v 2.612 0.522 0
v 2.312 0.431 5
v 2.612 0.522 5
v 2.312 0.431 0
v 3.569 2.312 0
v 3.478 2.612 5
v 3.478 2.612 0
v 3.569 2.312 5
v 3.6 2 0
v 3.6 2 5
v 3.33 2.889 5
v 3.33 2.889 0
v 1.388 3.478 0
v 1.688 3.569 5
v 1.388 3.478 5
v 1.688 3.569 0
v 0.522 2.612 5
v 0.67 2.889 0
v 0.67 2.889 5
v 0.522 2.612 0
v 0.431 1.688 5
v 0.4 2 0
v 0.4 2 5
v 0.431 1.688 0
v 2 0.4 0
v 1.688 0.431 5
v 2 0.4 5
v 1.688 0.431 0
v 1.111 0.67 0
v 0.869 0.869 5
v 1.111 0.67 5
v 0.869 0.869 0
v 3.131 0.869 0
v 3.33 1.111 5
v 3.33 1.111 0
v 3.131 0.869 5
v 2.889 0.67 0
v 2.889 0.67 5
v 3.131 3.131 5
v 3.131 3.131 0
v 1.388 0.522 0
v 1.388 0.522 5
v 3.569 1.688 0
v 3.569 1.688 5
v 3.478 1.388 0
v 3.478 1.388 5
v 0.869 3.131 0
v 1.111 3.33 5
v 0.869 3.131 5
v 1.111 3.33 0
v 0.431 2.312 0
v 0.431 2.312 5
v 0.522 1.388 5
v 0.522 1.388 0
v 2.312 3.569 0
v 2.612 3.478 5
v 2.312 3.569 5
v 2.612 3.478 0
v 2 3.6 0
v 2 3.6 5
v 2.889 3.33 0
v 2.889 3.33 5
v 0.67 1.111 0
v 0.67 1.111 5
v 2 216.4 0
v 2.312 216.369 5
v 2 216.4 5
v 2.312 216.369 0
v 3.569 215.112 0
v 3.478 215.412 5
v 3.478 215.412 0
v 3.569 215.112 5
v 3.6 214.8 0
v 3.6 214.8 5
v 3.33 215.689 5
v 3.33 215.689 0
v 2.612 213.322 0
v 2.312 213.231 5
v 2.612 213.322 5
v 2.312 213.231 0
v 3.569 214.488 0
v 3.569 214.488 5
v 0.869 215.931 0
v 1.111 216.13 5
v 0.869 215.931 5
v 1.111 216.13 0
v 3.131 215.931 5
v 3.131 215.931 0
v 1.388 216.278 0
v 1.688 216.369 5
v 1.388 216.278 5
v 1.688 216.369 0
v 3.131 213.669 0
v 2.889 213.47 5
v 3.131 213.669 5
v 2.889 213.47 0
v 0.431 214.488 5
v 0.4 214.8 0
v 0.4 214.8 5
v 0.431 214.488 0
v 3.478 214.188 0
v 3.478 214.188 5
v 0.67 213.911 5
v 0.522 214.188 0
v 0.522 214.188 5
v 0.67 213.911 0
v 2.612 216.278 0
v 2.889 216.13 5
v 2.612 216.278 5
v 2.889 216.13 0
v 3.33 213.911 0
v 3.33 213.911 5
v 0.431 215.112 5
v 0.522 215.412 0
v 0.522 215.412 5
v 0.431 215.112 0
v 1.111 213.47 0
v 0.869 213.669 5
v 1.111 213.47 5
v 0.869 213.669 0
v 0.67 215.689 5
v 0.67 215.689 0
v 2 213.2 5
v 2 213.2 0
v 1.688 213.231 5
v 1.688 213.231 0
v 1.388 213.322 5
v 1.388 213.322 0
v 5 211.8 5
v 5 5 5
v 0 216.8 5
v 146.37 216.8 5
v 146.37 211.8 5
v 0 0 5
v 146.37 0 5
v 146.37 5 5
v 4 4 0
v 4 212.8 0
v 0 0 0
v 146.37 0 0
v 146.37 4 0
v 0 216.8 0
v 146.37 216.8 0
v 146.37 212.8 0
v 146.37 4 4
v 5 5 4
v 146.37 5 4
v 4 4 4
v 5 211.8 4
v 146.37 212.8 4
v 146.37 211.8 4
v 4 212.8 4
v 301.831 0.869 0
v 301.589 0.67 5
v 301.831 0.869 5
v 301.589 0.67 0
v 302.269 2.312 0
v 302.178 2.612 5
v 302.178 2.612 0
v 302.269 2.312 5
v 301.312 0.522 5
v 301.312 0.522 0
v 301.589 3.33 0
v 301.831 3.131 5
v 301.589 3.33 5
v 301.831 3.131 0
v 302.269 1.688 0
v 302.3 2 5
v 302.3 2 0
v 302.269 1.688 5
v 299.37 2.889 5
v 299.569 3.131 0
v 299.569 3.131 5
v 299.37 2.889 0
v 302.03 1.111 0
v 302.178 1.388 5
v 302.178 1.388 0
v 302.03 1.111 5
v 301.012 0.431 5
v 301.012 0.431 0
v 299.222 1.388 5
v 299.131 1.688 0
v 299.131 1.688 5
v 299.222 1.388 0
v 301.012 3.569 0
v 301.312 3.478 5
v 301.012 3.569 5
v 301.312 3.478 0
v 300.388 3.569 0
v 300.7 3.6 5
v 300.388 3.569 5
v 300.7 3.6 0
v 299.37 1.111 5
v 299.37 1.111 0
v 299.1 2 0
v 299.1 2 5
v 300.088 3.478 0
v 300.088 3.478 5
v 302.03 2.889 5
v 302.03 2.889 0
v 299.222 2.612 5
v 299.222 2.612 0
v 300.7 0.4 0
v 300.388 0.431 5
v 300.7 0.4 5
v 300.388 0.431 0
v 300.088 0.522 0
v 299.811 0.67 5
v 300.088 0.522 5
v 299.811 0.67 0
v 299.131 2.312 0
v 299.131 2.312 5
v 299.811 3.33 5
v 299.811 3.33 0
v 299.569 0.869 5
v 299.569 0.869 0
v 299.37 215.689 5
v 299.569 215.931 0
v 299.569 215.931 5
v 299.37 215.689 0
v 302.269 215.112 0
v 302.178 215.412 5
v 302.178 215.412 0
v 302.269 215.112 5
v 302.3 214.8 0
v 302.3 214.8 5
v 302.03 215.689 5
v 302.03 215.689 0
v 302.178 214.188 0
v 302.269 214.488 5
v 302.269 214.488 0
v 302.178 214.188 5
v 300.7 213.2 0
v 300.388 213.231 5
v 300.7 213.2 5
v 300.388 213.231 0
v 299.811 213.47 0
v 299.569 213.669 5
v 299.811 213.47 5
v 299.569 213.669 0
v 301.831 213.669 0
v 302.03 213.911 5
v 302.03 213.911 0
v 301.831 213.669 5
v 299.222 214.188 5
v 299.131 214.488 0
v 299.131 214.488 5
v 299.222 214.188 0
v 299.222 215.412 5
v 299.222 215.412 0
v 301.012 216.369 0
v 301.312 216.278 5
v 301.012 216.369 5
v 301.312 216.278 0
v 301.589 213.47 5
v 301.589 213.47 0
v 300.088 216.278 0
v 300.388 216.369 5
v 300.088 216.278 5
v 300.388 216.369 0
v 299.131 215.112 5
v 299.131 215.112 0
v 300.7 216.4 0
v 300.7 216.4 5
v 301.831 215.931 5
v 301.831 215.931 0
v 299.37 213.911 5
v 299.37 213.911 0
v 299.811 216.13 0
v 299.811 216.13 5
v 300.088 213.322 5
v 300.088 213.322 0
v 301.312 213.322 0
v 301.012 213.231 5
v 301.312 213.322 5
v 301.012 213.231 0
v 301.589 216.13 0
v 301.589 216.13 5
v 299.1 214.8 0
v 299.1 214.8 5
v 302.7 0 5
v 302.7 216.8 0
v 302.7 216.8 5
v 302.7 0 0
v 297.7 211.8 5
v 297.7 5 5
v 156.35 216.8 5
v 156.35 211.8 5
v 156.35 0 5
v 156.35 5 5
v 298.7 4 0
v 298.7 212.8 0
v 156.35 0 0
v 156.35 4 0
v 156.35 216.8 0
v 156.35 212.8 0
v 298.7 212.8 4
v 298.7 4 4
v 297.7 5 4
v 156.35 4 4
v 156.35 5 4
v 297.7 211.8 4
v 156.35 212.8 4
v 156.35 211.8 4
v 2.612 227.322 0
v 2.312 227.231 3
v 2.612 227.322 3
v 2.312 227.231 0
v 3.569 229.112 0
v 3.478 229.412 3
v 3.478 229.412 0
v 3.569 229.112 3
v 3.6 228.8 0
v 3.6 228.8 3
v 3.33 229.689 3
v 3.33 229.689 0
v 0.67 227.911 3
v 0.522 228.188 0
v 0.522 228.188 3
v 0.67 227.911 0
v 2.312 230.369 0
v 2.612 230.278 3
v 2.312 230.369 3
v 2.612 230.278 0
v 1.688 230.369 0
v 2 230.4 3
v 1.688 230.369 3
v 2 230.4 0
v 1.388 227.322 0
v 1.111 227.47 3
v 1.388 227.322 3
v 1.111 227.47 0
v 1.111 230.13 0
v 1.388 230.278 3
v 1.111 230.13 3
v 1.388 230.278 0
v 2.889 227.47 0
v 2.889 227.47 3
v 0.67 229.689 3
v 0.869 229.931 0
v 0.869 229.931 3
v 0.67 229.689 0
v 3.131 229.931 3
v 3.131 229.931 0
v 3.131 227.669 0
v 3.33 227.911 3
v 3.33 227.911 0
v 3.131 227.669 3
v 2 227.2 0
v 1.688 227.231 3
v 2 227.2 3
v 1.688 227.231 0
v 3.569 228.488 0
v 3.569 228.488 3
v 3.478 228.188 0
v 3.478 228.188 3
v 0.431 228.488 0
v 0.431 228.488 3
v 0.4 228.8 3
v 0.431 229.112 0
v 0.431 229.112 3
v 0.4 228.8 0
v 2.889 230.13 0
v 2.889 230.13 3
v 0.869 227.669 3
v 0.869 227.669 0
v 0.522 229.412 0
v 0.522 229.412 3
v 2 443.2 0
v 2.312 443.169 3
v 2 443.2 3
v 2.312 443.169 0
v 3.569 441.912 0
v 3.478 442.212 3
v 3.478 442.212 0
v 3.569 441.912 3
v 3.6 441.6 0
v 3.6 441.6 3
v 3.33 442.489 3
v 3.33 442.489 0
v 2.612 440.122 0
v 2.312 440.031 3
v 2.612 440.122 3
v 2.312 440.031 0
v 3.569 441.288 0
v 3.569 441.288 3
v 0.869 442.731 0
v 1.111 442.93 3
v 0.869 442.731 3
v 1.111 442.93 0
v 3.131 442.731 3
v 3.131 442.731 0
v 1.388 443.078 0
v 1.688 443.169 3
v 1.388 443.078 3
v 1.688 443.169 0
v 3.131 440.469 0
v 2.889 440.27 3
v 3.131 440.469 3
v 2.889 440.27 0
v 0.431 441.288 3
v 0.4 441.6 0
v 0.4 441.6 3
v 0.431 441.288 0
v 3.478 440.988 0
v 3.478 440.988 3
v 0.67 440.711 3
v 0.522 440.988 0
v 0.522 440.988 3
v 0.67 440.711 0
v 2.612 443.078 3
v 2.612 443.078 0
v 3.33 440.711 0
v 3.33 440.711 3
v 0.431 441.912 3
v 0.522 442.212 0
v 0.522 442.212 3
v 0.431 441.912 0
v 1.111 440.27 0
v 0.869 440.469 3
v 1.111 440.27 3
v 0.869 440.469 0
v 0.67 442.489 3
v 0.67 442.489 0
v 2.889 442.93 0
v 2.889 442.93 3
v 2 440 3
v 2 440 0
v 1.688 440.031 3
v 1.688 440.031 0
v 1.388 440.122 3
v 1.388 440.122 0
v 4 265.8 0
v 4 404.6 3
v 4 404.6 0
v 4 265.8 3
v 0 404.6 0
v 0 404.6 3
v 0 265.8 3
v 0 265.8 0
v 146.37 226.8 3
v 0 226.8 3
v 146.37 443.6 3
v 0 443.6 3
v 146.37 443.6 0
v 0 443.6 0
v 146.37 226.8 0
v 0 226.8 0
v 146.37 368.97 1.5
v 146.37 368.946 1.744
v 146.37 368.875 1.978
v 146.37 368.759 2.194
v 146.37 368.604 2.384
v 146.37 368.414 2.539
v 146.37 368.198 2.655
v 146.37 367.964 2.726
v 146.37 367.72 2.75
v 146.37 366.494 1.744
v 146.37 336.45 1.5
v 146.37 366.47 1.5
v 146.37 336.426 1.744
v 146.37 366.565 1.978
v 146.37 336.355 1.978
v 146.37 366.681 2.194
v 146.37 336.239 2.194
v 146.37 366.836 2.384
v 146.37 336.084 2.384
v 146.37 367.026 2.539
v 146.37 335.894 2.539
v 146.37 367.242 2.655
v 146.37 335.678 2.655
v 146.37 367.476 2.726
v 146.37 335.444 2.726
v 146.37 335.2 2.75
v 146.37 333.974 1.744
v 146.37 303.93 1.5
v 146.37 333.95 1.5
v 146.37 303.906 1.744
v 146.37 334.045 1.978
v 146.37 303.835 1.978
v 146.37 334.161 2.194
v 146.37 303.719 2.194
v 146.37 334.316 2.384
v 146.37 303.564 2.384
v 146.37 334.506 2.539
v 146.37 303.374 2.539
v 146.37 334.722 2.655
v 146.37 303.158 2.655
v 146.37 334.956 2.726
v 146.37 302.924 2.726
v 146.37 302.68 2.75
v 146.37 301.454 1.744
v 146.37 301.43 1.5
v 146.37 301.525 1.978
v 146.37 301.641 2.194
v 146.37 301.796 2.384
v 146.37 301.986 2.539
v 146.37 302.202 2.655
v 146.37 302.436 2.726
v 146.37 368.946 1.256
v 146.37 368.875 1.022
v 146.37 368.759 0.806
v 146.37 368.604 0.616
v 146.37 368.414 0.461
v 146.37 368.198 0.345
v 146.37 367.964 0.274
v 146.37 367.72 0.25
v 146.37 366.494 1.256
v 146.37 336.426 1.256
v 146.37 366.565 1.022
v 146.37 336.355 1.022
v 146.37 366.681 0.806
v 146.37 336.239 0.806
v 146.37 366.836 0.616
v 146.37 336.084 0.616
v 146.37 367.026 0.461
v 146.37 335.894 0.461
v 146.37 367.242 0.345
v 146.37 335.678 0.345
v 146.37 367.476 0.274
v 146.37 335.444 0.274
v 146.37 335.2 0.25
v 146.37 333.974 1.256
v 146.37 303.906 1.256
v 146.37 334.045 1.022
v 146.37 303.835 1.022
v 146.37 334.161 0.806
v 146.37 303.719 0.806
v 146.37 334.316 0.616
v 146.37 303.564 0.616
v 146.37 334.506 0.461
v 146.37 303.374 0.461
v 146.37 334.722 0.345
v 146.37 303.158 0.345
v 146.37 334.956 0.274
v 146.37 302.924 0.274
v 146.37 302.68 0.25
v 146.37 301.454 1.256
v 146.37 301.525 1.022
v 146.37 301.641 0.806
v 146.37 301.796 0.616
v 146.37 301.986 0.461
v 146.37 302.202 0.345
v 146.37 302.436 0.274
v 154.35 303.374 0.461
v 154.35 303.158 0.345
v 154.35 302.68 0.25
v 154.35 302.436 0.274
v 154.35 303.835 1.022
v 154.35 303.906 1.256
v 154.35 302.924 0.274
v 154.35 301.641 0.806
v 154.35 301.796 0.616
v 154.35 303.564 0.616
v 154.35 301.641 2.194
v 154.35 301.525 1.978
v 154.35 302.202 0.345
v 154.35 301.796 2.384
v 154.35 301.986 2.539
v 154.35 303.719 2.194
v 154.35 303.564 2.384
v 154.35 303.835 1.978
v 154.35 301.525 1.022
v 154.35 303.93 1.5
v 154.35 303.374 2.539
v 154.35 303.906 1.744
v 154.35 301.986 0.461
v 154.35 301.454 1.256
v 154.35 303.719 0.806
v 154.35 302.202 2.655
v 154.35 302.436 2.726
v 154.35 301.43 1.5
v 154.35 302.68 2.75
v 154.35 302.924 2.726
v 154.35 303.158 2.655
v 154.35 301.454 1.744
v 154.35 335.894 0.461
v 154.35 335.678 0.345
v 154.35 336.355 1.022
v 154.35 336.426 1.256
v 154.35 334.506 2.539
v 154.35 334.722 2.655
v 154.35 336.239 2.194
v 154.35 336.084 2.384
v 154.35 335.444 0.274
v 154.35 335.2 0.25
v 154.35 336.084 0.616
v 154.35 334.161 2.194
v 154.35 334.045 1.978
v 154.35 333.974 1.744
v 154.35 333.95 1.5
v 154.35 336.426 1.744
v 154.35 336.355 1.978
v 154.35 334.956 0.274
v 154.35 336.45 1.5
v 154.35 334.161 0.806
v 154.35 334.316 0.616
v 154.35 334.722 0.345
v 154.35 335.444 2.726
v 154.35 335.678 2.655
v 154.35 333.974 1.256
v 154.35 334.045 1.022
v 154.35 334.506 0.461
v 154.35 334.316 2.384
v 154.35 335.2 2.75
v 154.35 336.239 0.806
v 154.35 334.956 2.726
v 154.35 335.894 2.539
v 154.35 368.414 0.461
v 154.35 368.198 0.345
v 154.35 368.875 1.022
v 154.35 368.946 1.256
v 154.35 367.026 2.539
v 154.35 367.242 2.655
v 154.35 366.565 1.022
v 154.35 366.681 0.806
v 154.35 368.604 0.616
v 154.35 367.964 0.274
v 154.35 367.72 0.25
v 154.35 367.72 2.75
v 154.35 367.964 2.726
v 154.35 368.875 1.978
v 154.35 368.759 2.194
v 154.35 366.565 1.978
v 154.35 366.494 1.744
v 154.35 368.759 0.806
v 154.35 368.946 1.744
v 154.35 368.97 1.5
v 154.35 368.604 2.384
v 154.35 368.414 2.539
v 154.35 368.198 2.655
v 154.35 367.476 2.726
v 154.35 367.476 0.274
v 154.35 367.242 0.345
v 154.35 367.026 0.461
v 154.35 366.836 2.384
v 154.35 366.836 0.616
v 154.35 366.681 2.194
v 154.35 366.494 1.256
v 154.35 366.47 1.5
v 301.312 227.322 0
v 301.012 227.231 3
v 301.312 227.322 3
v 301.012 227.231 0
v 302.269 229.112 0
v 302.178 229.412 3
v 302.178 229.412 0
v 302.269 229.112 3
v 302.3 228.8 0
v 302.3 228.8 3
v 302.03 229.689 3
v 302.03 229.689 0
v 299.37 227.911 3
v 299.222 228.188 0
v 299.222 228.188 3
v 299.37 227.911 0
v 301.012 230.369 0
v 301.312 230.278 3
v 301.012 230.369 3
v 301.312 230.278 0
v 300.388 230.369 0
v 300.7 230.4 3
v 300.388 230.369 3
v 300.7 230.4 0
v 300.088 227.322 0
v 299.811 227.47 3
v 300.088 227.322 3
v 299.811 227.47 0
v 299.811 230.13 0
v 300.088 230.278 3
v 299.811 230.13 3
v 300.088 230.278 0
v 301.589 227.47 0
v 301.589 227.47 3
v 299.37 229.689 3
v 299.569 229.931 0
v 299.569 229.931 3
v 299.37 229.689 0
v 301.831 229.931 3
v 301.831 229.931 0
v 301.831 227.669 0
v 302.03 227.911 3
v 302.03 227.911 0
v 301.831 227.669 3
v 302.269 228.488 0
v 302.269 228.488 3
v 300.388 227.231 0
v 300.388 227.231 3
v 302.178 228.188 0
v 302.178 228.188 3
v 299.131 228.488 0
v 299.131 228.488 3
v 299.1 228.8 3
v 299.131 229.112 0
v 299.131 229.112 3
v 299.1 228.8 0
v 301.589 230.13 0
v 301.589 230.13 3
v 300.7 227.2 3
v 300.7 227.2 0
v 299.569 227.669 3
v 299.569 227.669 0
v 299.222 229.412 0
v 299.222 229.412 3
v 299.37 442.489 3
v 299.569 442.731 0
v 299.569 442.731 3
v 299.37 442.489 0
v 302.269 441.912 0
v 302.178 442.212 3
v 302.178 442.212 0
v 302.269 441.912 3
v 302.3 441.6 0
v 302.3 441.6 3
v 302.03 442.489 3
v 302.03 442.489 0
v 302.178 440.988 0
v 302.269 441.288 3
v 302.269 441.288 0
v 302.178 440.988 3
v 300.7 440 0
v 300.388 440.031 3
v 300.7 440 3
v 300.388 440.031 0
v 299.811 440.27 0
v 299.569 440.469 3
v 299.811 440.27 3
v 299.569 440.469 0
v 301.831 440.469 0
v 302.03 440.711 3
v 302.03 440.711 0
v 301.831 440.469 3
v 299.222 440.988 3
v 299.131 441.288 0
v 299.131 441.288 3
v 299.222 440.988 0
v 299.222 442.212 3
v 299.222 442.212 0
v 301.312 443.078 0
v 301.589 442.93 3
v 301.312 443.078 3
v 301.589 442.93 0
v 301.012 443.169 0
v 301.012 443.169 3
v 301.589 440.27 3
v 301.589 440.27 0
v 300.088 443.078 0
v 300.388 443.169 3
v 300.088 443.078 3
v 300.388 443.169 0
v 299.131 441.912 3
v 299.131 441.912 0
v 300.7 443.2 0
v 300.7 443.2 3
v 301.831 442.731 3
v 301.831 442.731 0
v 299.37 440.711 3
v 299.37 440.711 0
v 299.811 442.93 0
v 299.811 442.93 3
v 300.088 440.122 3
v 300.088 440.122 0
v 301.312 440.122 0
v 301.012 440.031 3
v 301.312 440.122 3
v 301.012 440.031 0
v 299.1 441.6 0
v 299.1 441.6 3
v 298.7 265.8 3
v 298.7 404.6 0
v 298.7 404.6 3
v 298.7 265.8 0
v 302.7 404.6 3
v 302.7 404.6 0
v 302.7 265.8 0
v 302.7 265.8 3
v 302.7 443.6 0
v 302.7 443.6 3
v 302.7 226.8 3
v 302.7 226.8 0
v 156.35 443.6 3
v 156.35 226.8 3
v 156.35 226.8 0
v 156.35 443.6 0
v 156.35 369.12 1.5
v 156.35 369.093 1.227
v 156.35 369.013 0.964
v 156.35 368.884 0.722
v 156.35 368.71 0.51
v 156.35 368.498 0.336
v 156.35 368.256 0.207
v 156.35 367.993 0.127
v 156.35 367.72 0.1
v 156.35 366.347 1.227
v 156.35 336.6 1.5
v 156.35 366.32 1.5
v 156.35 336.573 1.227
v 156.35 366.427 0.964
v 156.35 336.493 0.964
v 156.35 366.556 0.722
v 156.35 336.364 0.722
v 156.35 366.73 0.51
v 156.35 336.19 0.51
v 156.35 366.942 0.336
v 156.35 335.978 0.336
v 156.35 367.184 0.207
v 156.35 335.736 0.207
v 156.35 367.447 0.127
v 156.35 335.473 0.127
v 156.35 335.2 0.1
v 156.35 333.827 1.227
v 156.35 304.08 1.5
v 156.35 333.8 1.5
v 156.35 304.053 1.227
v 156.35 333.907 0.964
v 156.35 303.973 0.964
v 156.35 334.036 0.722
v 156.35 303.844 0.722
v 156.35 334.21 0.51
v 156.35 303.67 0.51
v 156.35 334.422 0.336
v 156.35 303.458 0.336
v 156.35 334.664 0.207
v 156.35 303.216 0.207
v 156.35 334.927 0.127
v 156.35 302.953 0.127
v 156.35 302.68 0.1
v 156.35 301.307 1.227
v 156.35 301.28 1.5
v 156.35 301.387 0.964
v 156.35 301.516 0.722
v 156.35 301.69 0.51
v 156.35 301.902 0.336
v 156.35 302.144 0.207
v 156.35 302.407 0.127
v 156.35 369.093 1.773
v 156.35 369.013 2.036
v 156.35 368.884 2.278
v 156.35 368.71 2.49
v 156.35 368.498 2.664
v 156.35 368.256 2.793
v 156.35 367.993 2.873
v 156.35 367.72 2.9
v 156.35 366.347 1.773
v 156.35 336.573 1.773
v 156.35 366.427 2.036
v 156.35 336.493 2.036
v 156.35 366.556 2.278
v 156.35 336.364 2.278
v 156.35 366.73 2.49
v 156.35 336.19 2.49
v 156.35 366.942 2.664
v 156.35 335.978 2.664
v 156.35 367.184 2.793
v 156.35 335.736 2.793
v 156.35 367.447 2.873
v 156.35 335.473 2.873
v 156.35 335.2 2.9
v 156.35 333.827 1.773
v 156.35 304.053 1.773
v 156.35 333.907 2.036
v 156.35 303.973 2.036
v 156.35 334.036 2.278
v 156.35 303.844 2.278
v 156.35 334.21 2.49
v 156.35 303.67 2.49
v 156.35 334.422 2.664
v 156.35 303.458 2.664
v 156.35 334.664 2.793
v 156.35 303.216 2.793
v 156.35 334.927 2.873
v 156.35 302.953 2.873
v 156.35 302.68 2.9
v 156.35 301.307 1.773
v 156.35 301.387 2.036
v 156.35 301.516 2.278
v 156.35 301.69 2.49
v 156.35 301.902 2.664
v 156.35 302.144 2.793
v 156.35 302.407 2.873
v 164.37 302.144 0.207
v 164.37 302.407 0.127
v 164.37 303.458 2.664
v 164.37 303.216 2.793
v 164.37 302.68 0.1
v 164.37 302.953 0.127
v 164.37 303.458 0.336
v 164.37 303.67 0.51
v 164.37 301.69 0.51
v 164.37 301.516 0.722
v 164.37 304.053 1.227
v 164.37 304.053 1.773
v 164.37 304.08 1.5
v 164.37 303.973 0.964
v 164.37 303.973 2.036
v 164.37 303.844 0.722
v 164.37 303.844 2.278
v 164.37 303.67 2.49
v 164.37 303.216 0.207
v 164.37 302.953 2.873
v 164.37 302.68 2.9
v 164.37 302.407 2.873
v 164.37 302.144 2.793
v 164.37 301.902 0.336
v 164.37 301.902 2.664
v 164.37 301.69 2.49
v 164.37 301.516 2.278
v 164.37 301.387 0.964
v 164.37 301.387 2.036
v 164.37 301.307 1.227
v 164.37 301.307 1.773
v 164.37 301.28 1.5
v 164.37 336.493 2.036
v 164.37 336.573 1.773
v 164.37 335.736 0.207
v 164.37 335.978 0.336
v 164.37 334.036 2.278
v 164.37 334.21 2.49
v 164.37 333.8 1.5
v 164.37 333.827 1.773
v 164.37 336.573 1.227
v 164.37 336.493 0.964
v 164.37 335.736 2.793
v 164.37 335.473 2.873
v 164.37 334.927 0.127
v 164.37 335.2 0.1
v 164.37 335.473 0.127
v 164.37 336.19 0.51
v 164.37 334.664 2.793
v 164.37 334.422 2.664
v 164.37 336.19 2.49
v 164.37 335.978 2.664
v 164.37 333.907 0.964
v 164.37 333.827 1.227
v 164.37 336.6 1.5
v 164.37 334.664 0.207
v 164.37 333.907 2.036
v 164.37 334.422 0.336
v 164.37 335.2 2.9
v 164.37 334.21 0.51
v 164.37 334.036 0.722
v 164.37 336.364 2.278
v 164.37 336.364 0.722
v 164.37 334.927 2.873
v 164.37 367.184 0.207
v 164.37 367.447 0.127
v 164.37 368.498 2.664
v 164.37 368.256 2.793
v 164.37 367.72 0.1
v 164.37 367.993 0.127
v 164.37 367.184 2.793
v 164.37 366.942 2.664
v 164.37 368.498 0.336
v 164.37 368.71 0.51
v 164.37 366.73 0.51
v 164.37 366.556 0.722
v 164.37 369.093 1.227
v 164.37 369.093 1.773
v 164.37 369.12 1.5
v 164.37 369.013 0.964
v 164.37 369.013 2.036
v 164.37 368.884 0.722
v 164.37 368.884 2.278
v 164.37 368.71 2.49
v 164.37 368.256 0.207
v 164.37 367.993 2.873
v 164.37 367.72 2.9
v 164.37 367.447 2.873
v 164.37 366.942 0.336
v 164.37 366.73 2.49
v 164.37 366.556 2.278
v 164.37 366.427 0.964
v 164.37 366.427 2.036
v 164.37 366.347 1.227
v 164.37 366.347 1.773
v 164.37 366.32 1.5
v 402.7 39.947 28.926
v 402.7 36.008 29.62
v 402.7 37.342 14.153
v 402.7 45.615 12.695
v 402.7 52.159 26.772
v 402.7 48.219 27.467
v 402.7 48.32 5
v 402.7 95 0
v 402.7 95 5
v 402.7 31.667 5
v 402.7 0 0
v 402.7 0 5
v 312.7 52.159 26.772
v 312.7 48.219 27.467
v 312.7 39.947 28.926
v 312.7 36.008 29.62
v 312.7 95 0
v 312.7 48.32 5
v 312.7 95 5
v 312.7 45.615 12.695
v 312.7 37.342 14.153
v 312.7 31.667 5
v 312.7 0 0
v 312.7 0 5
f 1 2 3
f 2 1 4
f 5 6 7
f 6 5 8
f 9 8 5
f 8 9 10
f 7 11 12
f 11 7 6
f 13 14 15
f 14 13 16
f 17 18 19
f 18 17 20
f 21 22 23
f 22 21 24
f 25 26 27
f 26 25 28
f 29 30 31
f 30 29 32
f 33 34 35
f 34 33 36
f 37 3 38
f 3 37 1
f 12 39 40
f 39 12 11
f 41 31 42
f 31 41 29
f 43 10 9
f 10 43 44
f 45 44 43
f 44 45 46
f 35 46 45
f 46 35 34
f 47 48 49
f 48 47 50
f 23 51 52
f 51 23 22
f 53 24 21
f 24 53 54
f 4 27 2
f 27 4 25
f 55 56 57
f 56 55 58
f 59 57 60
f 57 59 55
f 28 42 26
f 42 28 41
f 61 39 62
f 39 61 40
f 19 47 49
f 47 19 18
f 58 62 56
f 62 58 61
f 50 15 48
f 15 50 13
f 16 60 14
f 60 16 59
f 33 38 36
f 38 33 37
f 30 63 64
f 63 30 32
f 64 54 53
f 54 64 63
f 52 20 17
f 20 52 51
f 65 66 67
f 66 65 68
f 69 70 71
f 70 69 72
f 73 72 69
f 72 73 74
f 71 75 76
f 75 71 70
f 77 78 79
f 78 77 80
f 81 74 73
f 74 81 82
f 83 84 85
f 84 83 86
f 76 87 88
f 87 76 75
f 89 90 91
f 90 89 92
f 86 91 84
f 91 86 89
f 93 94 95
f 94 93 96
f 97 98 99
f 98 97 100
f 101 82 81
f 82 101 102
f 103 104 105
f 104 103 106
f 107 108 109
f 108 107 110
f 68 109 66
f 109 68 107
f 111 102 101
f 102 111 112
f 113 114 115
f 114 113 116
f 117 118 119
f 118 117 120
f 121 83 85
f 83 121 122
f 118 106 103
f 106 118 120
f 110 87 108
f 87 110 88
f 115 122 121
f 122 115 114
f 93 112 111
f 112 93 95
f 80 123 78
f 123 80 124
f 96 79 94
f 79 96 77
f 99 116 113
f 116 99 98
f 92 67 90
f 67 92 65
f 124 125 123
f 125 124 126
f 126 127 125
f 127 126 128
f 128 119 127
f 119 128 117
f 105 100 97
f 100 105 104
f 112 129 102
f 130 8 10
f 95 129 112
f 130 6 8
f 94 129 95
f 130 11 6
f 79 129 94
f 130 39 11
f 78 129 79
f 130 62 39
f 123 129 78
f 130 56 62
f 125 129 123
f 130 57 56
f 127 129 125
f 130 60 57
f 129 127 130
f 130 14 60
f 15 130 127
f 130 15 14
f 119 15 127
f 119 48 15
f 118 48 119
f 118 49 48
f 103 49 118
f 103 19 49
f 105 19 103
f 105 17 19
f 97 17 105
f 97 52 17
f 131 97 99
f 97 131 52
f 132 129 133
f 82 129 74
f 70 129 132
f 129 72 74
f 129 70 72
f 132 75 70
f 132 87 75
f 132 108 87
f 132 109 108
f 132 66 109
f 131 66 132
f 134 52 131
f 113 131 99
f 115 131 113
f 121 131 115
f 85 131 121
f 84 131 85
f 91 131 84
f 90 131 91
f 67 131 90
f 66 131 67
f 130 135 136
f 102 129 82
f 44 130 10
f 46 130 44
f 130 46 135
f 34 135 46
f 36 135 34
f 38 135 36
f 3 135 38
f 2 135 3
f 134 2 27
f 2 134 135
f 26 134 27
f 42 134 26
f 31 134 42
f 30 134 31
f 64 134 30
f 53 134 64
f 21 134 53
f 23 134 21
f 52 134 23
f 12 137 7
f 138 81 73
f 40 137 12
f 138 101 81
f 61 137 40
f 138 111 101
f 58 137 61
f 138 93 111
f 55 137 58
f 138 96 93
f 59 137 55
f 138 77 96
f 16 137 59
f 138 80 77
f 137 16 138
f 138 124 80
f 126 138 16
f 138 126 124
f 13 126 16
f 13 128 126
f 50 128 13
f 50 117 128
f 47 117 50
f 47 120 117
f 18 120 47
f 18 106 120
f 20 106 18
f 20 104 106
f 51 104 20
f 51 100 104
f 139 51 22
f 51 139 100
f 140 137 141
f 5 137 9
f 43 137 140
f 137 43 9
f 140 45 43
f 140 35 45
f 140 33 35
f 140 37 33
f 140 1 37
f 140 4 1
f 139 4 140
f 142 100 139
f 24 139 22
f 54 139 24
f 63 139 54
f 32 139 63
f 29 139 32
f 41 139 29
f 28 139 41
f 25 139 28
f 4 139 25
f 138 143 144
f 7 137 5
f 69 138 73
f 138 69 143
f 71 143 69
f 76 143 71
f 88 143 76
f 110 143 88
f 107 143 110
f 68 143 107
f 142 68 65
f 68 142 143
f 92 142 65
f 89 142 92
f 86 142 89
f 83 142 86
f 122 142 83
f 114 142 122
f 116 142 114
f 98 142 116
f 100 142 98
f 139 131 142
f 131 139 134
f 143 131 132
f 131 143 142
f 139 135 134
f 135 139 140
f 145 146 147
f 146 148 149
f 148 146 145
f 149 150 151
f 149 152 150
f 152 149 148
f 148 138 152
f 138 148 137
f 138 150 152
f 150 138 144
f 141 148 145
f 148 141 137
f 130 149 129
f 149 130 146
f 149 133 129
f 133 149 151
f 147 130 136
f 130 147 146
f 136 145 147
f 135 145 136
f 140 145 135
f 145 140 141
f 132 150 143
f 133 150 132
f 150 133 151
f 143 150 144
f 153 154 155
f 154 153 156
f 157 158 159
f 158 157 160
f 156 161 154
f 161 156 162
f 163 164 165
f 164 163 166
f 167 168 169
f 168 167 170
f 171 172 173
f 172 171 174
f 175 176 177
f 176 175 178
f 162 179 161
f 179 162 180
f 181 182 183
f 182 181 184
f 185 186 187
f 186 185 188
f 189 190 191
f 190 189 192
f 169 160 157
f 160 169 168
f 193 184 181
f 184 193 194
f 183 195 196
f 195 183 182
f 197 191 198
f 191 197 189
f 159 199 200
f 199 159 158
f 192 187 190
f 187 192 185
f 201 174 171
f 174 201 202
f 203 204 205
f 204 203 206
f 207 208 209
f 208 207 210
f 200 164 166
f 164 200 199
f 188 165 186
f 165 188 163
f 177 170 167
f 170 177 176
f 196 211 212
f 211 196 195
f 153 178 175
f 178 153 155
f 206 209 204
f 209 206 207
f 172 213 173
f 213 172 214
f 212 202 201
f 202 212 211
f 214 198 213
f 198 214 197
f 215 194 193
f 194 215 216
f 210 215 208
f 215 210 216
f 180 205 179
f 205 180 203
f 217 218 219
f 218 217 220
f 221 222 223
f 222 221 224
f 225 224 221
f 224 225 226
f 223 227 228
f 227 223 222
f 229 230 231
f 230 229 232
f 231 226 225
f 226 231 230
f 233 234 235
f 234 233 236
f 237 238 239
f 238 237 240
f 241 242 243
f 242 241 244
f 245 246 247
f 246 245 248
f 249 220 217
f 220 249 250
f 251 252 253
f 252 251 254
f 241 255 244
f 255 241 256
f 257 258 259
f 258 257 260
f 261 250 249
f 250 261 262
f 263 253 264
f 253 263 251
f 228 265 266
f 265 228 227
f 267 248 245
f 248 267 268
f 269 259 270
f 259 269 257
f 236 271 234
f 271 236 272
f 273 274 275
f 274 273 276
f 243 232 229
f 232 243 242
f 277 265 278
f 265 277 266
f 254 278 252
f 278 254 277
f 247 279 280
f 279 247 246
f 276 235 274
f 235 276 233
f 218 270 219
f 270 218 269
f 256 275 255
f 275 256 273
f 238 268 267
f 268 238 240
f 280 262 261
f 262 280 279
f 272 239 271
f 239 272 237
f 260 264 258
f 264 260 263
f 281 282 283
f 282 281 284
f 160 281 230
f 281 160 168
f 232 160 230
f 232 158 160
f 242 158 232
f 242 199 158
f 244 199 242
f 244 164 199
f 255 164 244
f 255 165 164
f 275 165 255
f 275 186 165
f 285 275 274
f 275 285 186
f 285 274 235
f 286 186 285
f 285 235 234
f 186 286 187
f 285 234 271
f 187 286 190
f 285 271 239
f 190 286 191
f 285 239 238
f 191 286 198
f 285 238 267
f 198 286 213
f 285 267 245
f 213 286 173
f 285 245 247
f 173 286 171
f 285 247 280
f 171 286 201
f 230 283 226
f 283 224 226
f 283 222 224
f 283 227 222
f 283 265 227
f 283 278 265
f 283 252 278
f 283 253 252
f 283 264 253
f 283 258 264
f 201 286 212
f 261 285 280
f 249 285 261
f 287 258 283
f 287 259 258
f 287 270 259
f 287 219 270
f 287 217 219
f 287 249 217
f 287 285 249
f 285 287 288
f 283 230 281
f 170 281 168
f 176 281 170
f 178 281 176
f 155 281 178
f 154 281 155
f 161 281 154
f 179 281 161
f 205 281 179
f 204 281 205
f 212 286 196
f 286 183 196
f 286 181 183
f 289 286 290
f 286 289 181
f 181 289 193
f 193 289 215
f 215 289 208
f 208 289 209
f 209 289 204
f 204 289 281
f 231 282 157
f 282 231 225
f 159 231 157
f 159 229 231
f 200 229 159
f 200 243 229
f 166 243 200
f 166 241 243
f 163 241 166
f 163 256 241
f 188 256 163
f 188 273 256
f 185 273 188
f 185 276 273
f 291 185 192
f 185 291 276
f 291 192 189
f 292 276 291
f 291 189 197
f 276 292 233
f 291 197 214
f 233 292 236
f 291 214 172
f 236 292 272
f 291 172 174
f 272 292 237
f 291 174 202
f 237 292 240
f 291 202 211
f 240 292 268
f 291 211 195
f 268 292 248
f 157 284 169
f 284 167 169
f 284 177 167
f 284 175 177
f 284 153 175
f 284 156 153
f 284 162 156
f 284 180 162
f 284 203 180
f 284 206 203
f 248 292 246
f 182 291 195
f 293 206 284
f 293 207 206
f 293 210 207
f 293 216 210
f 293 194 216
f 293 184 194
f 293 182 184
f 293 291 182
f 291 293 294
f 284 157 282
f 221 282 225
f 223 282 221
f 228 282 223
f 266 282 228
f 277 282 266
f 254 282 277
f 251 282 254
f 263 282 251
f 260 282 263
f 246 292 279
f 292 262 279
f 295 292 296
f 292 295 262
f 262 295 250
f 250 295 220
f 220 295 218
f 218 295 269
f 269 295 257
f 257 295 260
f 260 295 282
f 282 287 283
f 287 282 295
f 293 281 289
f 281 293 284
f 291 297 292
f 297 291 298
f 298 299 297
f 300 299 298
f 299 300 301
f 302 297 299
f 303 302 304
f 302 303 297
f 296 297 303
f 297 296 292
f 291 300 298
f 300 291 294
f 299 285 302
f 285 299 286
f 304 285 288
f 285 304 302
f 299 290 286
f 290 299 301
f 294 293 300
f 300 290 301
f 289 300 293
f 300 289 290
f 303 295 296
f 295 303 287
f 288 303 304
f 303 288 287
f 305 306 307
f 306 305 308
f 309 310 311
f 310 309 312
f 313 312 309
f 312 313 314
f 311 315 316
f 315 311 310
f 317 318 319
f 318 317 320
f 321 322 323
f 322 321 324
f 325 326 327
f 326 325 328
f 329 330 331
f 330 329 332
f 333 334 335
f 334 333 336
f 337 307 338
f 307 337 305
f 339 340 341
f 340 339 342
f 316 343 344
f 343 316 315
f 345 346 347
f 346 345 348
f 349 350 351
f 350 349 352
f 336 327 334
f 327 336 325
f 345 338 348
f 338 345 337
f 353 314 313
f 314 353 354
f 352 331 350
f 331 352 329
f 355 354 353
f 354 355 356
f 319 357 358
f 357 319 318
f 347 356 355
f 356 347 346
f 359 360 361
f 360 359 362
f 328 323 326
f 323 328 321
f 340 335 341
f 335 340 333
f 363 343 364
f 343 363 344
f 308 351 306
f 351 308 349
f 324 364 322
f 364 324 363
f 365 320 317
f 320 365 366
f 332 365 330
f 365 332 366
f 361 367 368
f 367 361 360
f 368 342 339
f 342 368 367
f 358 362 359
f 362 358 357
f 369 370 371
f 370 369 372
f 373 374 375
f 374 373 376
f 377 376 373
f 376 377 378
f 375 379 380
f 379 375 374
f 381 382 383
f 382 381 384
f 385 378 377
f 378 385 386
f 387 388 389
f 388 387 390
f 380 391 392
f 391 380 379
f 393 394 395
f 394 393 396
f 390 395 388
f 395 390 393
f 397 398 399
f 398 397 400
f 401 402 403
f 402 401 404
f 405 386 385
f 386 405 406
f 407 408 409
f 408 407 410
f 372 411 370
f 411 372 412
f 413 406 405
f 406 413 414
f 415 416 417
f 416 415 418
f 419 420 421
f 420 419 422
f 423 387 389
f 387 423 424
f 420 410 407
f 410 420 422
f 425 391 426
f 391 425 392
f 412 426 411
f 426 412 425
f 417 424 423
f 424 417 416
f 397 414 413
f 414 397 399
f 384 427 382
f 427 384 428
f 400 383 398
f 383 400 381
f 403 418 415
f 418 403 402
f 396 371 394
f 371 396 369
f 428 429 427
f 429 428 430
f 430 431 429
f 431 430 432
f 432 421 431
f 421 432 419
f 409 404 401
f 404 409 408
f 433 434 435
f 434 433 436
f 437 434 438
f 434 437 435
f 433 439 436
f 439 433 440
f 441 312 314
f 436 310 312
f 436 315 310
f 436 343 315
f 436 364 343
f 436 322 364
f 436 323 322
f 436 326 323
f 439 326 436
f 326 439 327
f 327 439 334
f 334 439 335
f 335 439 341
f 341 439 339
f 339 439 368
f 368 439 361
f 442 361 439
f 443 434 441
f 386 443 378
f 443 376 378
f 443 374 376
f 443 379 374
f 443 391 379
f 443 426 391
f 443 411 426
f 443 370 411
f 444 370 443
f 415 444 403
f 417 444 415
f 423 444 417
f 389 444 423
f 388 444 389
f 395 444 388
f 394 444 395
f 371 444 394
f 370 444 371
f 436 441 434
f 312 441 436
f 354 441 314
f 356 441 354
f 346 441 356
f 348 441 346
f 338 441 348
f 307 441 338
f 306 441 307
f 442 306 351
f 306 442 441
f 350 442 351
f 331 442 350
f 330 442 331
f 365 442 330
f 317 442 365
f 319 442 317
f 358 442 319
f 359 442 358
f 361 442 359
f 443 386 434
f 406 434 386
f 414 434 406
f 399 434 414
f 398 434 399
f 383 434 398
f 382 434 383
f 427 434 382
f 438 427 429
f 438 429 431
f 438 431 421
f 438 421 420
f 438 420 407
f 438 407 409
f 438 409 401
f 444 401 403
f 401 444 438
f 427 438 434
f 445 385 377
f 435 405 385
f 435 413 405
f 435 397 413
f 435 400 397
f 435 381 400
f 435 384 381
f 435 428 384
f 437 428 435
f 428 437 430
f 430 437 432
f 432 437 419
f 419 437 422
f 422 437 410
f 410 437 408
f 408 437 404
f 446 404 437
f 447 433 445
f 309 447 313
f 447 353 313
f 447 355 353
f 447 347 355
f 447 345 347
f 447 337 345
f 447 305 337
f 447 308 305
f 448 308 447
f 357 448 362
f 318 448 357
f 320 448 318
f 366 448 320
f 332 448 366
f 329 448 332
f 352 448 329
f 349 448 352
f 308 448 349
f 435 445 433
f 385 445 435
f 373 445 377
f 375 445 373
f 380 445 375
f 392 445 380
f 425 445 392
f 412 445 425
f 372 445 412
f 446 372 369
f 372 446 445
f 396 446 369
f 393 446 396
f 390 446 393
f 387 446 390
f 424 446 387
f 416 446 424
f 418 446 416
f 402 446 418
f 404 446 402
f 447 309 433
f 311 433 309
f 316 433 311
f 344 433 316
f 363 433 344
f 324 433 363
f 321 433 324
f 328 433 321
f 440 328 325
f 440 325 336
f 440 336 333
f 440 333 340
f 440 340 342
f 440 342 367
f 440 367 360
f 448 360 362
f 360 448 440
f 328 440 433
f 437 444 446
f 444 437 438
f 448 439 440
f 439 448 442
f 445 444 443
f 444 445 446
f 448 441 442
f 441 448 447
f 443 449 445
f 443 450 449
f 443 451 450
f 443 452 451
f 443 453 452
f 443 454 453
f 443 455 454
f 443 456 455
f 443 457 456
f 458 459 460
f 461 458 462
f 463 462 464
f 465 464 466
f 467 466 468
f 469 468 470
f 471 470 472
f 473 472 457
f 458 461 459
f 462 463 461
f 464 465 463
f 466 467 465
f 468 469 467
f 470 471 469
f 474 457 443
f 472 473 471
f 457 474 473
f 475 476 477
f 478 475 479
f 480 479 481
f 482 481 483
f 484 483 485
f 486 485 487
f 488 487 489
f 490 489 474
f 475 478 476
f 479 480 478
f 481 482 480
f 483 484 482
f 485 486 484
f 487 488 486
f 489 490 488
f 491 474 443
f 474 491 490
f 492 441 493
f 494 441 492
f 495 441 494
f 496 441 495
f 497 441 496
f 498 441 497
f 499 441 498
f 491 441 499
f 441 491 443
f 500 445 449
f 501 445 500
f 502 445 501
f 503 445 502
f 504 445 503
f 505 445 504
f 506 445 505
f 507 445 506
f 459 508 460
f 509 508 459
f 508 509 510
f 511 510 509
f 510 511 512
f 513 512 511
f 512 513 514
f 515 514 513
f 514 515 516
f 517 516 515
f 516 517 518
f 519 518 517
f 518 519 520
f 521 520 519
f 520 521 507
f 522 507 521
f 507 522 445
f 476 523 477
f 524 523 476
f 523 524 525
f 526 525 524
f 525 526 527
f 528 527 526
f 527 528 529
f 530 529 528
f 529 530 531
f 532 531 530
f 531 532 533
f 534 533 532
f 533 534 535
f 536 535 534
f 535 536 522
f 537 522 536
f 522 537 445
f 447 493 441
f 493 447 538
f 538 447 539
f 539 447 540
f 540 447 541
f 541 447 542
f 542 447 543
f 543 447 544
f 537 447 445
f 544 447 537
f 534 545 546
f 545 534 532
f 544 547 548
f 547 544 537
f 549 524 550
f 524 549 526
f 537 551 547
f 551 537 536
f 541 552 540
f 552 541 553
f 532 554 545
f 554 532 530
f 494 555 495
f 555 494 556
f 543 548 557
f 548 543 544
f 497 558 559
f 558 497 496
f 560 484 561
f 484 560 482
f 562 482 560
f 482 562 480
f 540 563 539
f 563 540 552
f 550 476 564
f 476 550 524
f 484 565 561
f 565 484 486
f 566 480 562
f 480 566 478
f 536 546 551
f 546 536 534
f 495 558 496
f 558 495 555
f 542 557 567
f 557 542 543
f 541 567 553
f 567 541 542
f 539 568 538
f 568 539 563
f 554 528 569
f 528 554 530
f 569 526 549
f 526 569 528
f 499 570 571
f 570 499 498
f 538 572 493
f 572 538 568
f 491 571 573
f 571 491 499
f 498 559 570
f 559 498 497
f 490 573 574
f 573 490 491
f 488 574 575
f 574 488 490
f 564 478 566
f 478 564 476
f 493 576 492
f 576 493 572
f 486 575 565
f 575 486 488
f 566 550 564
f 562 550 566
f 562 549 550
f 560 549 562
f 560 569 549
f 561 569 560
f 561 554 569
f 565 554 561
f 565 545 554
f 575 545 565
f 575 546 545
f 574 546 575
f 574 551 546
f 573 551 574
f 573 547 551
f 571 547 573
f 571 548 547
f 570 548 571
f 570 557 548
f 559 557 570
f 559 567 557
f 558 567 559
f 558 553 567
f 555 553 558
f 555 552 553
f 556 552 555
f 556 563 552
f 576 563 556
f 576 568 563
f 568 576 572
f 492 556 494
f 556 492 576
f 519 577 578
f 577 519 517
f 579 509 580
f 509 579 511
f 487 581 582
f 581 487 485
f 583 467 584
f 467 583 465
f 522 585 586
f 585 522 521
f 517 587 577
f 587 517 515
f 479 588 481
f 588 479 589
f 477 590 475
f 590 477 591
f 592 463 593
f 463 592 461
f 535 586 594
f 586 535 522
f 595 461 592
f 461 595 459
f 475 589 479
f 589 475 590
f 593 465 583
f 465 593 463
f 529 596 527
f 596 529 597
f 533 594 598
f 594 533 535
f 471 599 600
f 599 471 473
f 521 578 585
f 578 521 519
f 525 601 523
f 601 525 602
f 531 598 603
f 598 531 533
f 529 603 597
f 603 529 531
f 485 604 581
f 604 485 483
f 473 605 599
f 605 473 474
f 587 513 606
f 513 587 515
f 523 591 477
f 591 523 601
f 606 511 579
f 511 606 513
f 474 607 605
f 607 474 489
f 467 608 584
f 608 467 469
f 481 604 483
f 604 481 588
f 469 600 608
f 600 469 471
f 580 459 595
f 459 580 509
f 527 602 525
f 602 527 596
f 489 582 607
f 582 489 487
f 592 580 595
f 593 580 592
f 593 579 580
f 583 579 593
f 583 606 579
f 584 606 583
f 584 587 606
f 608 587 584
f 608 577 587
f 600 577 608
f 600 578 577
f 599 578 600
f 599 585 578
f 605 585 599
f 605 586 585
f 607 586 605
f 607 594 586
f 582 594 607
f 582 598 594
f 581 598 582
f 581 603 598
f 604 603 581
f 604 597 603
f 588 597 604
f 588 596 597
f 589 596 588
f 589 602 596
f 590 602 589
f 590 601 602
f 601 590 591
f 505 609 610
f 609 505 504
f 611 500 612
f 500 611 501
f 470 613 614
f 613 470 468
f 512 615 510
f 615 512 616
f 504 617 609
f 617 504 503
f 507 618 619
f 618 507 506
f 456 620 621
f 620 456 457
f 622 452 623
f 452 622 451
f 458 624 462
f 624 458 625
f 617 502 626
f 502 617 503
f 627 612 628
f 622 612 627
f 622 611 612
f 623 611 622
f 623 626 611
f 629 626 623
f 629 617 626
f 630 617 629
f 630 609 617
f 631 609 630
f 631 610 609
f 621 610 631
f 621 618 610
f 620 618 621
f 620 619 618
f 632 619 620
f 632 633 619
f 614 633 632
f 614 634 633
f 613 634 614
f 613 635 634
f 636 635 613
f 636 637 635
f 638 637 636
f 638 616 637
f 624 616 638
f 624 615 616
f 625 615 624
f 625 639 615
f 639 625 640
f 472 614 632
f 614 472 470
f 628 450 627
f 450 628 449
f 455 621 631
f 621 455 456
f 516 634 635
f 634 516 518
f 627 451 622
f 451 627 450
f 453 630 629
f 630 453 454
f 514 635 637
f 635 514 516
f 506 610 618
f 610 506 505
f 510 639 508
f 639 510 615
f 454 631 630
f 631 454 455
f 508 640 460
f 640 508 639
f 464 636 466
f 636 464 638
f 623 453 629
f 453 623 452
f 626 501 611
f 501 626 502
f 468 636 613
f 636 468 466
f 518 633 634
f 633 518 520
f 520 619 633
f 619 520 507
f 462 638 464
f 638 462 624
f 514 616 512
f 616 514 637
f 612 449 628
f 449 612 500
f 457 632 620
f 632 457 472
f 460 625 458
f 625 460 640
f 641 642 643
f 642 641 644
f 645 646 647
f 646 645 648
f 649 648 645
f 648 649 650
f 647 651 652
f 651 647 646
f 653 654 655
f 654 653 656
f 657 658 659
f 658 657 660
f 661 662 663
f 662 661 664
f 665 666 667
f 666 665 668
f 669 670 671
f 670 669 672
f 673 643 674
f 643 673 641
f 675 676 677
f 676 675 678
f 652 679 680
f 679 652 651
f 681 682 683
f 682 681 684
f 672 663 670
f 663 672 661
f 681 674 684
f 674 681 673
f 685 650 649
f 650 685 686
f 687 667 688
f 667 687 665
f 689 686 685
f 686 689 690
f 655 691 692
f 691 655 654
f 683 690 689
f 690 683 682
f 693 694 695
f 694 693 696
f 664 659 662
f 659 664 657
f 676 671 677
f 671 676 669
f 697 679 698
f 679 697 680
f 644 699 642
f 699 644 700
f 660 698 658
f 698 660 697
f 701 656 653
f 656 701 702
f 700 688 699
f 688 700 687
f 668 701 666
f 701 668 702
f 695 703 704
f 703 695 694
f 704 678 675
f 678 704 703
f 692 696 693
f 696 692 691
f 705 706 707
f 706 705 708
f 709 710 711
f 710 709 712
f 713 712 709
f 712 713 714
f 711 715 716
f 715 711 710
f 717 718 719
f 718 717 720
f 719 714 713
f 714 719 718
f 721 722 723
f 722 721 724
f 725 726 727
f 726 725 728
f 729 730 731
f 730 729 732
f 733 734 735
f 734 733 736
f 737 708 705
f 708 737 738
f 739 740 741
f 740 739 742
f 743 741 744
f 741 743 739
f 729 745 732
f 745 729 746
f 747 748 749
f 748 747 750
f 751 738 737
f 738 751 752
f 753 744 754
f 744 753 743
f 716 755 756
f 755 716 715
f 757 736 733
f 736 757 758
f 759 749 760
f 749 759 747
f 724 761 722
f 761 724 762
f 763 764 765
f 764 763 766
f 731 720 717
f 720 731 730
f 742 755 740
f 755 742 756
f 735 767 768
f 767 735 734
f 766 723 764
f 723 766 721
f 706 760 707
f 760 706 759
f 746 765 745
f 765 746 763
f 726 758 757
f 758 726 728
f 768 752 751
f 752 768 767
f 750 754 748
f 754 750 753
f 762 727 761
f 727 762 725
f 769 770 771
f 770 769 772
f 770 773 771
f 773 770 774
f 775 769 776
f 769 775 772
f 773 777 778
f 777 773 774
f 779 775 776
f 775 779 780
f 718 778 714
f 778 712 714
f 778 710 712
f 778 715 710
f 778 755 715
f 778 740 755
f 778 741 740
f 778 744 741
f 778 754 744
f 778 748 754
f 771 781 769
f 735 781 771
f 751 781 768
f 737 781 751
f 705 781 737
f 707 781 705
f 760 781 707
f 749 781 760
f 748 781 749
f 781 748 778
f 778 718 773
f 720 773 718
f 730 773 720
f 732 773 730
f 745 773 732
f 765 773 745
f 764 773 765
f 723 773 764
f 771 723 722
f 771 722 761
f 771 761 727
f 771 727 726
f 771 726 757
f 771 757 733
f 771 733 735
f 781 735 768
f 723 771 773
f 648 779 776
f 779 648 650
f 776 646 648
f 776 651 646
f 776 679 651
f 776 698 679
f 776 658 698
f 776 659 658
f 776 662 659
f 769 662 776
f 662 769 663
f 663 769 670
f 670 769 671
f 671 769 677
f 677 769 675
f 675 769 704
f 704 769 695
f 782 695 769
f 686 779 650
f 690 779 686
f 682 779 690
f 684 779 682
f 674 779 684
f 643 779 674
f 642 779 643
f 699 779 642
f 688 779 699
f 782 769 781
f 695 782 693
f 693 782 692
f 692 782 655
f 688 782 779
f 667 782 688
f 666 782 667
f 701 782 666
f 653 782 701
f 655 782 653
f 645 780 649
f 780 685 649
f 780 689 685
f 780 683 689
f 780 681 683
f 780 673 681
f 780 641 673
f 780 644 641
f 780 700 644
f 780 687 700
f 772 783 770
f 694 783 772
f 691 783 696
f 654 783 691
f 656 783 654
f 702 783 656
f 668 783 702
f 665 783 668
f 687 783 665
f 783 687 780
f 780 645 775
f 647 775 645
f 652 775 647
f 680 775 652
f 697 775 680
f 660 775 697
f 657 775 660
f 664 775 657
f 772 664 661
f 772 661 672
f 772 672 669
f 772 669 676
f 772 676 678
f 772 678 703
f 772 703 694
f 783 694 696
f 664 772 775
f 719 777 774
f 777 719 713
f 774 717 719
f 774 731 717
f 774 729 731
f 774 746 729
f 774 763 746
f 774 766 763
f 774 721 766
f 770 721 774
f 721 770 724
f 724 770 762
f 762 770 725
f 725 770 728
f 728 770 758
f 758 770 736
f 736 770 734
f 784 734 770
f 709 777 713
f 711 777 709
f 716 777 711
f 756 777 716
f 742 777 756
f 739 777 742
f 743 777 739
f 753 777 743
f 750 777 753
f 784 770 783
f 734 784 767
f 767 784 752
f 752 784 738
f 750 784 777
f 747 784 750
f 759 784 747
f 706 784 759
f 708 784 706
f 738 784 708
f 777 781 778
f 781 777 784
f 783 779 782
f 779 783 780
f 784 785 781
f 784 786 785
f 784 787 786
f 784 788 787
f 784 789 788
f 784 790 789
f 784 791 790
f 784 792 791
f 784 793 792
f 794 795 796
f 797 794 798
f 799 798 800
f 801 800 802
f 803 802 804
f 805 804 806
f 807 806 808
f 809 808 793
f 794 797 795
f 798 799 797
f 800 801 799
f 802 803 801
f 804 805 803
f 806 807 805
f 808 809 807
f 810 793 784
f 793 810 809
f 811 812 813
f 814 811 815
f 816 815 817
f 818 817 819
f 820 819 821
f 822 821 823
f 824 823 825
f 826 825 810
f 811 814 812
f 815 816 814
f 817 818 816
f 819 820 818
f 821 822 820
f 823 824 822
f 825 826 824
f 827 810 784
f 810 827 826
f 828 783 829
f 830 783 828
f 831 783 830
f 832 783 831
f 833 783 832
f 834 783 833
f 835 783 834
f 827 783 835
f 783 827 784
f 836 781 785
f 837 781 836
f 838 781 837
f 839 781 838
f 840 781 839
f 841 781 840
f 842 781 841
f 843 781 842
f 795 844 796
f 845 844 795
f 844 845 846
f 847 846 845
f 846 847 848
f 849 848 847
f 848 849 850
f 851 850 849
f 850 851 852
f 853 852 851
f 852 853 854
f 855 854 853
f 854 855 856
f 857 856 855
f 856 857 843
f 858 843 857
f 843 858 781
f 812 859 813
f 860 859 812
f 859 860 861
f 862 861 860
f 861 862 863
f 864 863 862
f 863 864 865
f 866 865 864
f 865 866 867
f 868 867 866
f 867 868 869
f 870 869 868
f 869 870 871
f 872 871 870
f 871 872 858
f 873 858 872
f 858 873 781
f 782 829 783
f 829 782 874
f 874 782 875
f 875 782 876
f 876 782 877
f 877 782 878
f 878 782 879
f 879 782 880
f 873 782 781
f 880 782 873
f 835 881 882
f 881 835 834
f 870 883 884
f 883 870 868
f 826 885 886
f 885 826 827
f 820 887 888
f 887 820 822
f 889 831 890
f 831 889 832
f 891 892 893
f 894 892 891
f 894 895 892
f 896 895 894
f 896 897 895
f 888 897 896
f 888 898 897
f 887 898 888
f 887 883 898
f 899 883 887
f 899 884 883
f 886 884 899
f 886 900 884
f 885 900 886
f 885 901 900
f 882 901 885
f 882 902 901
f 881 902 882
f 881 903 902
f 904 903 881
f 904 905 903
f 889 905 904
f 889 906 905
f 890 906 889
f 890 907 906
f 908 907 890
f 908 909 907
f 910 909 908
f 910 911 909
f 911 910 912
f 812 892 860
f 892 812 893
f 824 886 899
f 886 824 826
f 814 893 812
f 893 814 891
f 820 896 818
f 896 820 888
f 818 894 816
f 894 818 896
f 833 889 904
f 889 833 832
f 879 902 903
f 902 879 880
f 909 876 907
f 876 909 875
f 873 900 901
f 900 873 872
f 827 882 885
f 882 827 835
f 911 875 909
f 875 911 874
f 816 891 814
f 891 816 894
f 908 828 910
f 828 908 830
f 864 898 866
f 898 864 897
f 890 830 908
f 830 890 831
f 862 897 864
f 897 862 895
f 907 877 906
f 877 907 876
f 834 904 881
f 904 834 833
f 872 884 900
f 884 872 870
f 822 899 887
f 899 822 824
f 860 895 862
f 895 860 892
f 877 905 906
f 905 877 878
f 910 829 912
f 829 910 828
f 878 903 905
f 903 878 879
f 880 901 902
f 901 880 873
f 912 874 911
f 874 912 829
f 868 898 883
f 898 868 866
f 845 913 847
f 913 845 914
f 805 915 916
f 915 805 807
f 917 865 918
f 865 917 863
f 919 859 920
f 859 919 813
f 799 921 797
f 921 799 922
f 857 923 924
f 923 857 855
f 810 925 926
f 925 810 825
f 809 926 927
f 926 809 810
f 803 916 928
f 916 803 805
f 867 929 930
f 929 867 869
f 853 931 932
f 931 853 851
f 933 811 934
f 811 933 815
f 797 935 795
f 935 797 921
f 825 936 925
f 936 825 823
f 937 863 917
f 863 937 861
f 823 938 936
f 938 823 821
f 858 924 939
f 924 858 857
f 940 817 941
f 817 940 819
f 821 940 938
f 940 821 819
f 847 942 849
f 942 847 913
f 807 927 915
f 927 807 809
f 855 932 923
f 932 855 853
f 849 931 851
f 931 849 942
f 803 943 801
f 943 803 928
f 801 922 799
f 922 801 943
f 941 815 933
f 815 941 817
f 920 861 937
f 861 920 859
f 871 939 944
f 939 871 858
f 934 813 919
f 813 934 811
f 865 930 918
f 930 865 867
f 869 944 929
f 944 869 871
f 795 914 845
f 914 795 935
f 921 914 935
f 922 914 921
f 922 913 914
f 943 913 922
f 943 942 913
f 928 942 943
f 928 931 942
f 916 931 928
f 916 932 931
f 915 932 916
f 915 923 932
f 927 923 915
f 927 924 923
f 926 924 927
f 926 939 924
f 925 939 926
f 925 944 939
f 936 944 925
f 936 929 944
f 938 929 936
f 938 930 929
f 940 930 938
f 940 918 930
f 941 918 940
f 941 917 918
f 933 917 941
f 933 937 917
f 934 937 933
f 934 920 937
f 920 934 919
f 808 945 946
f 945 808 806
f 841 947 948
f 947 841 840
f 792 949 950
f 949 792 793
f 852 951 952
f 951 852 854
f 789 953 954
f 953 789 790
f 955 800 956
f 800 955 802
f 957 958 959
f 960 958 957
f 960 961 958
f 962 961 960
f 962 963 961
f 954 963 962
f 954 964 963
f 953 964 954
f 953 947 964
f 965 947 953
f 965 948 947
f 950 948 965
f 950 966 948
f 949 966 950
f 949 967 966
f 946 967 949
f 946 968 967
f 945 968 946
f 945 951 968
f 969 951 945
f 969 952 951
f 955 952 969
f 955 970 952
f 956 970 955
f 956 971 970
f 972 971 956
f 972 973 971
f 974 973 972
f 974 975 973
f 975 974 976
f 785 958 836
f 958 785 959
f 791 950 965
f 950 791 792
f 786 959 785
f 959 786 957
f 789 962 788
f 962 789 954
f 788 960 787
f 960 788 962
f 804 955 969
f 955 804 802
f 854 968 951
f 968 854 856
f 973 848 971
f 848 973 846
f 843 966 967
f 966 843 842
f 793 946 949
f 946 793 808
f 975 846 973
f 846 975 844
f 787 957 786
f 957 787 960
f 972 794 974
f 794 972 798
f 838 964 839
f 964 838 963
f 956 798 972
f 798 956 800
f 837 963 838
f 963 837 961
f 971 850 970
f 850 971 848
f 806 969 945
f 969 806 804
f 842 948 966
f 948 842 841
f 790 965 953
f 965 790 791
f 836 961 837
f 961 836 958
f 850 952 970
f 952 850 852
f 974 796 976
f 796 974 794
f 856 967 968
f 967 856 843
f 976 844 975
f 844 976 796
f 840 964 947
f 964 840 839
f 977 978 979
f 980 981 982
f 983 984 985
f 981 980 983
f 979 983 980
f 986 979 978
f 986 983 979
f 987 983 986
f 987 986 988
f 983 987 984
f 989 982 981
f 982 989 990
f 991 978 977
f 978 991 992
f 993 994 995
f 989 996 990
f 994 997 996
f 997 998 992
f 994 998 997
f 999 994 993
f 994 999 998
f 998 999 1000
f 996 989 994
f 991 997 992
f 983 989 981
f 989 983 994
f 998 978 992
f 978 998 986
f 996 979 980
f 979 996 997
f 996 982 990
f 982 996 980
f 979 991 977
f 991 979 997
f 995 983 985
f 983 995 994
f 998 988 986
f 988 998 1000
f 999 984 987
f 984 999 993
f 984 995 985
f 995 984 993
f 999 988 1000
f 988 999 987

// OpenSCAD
// Seeed Spectra6 13.3" — split for smaller printers (~220 mm bed).
// Front: plain split. Back: snap pegs align and hold the thin rear halves.
//
// Dimensions (mm):
//   Visible cutout:     270.4 x 202.8
//   Display (incl bezel): 284.7 x 208.8  (+14.3 x +6 beyond cutout)
//   Case outer:           292.7 x 216.8  (+8 x +8 beyond display)

// --- Display & case geometry ---
cutout_w = 270.4;
cutout_h = 202.8;
bezel_extra_w = 14.3;
bezel_extra_h = 6;
display_w = cutout_w + bezel_extra_w;
display_h = cutout_h + bezel_extra_h;
case_margin = 8;
case_w = display_w + case_margin;
case_h = display_h + case_margin;
side_margin = case_margin / 2;

display_x = side_margin;
display_y = side_margin;
cutout_x = display_x + (display_w - cutout_w) / 2;
cutout_y = display_y + (display_h - cutout_h) / 2;

// --- Part thickness ---
frame_depth = 5;
back_depth = 3;
case_thickness = frame_depth + back_depth;

// --- Frame lip (display pocket) ---
lip_h = 1;
lip_t = 1;
pocket_depth = frame_depth - lip_h;

// --- Fasteners (M3) ---
screw_hole_d = 3.2;
screw_inset = 2;

// --- Back ribbon cable notches (landscape: long edge horizontal) ---
cable_notch_inset = 39;
cable_notch_w = side_margin;
cable_notch_y = cable_notch_inset;
cable_notch_h = case_h - 2 * cable_notch_inset;

module cable_notches(depth) {
    translate([-0.01, cable_notch_y, -0.01])
        cube([cable_notch_w + 0.01, cable_notch_h, depth + 0.02]);
    translate([case_w - cable_notch_w, cable_notch_y, -0.01])
        cube([cable_notch_w + 0.01, cable_notch_h, depth + 0.02]);
}

// --- Split ---
split_x = case_w / 2;
snap_d = 5;
snap_len = 8;
snap_y = [case_h * 0.35, case_h * 0.5, case_h * 0.65];

// --- Stand foot (one segment; print foot_count copies) ---
stand_angle = 80;
stand_slot_clearance = 0.4;
stand_wall_t = 4;
foot_len = 90;
stand_foot_depth = 95;
stand_foot_back = stand_foot_depth / 3;
stand_foot_front = 2 * stand_foot_depth / 3;
stand_heel_h = 25;
stand_slot_depth = 15;
stand_base_t = 5;
foot_count = 4;  // suggested copies along the frame bottom edge

// --- Render control ---
part = "all";  // [front-left, front-right, back-left, back-right, foot, all]
layout_gap = 10;
layout_col_w = split_x + layout_gap;
layout_row_h = case_h + layout_gap;

module screw_holes(height) {
    positions = [
        [screw_inset, screw_inset],
        [case_w - screw_inset, screw_inset],
        [case_w - screw_inset, case_h - screw_inset],
        [screw_inset, case_h - screw_inset],
    ];
    for (pos = positions)
        translate([pos[0], pos[1], -0.01])
            cylinder(h = height + 0.02, d = screw_hole_d, $fn = 32);
}

module front_frame() {
    difference() {
        cube([case_w, case_h, frame_depth]);
        translate([cutout_x, cutout_y, -0.01])
            cube([cutout_w, cutout_h, frame_depth + 0.02]);
        translate([display_x, display_y, -0.01])
            cube([display_w, display_h, pocket_depth + 0.01]);
        translate([display_x + lip_t, display_y + lip_t, pocket_depth - 0.01])
            cube([display_w - 2 * lip_t, display_h - 2 * lip_t, lip_h + 0.02]);
        screw_holes(frame_depth);
    }
}

module back_panel() {
    difference() {
        cube([case_w, case_h, back_depth]);
        screw_holes(back_depth);
        cable_notches(back_depth);
    }
}

module clip_x_half(side, height) {
    pad = 0.02;
    intersection() {
        children();
        if (side == "left")
            cube([split_x + pad, case_h + pad, height + pad]);
        else
            translate([split_x, 0, 0])
                cube([case_w - split_x + pad, case_h + pad, height + pad]);
    }
}

module case_half(side, height) {
    if (side == "left") {
        clip_x_half("left", height)
            children();
    } else {
        translate([-split_x, 0, 0])
            clip_x_half("right", height)
                children();
    }
}

function snap_radius(height) = min(snap_d, height - 0.5);

module snap_pegs(height) {
    r = snap_radius(height);
    z = height / 2;
    for (y = snap_y)
        translate([split_x, y, z])
            rotate([0, 90, 0])
                cylinder(h = snap_len, d = r, $fn = 32);
}

module snap_holes(height) {
    r = snap_radius(height);
    z = height / 2;
    for (y = snap_y)
        translate([split_x, y, z])
            rotate([0, 90, 0])
                cylinder(h = snap_len + 0.02, d = r + 0.3, $fn = 32);
}

module front_frame_half(side) {
    case_half(side, frame_depth)
        front_frame();
}

module back_panel_half(side) {
    if (side == "left") {
        union() {
            clip_x_half("left", back_depth)
                back_panel();
            snap_pegs(back_depth);
        }
    } else {
        translate([-split_x, 0, 0])
            difference() {
                clip_x_half("right", back_depth)
                    back_panel();
                snap_holes(back_depth);
            }
    }
}

// stand_base, narrowed to foot_len; notch without end caps (open along X).
module stand_foot(angle = stand_angle) {
    slot_w = case_thickness + stand_slot_clearance;
    tilt = angle - 90;

    translate([0, -stand_foot_back, 0])
        cube([foot_len, stand_foot_depth, stand_base_t]);

    translate([0, 0, stand_base_t])
        rotate([tilt, 0, 0])
            difference() {
                cube([foot_len, slot_w + 2 * stand_wall_t, stand_heel_h]);
                translate([0, stand_wall_t, stand_heel_h - stand_slot_depth])
                    cube([foot_len, slot_w, stand_slot_depth + 0.02]);
            }
}

if (part == "all") {
    front_frame_half("left");
    translate([layout_col_w, 0, 0])
        front_frame_half("right");
    translate([0, layout_row_h, 0])
        back_panel_half("left");
    translate([layout_col_w, layout_row_h, 0])
        back_panel_half("right");
    translate([case_w + layout_gap * 2, stand_foot_back, 0])
        stand_foot();
} else if (part == "front-left") {
    front_frame_half("left");
} else if (part == "front-right") {
    front_frame_half("right");
} else if (part == "back-left") {
    back_panel_half("left");
} else if (part == "back-right") {
    back_panel_half("right");
} else if (part == "foot") {
    stand_foot();
}
